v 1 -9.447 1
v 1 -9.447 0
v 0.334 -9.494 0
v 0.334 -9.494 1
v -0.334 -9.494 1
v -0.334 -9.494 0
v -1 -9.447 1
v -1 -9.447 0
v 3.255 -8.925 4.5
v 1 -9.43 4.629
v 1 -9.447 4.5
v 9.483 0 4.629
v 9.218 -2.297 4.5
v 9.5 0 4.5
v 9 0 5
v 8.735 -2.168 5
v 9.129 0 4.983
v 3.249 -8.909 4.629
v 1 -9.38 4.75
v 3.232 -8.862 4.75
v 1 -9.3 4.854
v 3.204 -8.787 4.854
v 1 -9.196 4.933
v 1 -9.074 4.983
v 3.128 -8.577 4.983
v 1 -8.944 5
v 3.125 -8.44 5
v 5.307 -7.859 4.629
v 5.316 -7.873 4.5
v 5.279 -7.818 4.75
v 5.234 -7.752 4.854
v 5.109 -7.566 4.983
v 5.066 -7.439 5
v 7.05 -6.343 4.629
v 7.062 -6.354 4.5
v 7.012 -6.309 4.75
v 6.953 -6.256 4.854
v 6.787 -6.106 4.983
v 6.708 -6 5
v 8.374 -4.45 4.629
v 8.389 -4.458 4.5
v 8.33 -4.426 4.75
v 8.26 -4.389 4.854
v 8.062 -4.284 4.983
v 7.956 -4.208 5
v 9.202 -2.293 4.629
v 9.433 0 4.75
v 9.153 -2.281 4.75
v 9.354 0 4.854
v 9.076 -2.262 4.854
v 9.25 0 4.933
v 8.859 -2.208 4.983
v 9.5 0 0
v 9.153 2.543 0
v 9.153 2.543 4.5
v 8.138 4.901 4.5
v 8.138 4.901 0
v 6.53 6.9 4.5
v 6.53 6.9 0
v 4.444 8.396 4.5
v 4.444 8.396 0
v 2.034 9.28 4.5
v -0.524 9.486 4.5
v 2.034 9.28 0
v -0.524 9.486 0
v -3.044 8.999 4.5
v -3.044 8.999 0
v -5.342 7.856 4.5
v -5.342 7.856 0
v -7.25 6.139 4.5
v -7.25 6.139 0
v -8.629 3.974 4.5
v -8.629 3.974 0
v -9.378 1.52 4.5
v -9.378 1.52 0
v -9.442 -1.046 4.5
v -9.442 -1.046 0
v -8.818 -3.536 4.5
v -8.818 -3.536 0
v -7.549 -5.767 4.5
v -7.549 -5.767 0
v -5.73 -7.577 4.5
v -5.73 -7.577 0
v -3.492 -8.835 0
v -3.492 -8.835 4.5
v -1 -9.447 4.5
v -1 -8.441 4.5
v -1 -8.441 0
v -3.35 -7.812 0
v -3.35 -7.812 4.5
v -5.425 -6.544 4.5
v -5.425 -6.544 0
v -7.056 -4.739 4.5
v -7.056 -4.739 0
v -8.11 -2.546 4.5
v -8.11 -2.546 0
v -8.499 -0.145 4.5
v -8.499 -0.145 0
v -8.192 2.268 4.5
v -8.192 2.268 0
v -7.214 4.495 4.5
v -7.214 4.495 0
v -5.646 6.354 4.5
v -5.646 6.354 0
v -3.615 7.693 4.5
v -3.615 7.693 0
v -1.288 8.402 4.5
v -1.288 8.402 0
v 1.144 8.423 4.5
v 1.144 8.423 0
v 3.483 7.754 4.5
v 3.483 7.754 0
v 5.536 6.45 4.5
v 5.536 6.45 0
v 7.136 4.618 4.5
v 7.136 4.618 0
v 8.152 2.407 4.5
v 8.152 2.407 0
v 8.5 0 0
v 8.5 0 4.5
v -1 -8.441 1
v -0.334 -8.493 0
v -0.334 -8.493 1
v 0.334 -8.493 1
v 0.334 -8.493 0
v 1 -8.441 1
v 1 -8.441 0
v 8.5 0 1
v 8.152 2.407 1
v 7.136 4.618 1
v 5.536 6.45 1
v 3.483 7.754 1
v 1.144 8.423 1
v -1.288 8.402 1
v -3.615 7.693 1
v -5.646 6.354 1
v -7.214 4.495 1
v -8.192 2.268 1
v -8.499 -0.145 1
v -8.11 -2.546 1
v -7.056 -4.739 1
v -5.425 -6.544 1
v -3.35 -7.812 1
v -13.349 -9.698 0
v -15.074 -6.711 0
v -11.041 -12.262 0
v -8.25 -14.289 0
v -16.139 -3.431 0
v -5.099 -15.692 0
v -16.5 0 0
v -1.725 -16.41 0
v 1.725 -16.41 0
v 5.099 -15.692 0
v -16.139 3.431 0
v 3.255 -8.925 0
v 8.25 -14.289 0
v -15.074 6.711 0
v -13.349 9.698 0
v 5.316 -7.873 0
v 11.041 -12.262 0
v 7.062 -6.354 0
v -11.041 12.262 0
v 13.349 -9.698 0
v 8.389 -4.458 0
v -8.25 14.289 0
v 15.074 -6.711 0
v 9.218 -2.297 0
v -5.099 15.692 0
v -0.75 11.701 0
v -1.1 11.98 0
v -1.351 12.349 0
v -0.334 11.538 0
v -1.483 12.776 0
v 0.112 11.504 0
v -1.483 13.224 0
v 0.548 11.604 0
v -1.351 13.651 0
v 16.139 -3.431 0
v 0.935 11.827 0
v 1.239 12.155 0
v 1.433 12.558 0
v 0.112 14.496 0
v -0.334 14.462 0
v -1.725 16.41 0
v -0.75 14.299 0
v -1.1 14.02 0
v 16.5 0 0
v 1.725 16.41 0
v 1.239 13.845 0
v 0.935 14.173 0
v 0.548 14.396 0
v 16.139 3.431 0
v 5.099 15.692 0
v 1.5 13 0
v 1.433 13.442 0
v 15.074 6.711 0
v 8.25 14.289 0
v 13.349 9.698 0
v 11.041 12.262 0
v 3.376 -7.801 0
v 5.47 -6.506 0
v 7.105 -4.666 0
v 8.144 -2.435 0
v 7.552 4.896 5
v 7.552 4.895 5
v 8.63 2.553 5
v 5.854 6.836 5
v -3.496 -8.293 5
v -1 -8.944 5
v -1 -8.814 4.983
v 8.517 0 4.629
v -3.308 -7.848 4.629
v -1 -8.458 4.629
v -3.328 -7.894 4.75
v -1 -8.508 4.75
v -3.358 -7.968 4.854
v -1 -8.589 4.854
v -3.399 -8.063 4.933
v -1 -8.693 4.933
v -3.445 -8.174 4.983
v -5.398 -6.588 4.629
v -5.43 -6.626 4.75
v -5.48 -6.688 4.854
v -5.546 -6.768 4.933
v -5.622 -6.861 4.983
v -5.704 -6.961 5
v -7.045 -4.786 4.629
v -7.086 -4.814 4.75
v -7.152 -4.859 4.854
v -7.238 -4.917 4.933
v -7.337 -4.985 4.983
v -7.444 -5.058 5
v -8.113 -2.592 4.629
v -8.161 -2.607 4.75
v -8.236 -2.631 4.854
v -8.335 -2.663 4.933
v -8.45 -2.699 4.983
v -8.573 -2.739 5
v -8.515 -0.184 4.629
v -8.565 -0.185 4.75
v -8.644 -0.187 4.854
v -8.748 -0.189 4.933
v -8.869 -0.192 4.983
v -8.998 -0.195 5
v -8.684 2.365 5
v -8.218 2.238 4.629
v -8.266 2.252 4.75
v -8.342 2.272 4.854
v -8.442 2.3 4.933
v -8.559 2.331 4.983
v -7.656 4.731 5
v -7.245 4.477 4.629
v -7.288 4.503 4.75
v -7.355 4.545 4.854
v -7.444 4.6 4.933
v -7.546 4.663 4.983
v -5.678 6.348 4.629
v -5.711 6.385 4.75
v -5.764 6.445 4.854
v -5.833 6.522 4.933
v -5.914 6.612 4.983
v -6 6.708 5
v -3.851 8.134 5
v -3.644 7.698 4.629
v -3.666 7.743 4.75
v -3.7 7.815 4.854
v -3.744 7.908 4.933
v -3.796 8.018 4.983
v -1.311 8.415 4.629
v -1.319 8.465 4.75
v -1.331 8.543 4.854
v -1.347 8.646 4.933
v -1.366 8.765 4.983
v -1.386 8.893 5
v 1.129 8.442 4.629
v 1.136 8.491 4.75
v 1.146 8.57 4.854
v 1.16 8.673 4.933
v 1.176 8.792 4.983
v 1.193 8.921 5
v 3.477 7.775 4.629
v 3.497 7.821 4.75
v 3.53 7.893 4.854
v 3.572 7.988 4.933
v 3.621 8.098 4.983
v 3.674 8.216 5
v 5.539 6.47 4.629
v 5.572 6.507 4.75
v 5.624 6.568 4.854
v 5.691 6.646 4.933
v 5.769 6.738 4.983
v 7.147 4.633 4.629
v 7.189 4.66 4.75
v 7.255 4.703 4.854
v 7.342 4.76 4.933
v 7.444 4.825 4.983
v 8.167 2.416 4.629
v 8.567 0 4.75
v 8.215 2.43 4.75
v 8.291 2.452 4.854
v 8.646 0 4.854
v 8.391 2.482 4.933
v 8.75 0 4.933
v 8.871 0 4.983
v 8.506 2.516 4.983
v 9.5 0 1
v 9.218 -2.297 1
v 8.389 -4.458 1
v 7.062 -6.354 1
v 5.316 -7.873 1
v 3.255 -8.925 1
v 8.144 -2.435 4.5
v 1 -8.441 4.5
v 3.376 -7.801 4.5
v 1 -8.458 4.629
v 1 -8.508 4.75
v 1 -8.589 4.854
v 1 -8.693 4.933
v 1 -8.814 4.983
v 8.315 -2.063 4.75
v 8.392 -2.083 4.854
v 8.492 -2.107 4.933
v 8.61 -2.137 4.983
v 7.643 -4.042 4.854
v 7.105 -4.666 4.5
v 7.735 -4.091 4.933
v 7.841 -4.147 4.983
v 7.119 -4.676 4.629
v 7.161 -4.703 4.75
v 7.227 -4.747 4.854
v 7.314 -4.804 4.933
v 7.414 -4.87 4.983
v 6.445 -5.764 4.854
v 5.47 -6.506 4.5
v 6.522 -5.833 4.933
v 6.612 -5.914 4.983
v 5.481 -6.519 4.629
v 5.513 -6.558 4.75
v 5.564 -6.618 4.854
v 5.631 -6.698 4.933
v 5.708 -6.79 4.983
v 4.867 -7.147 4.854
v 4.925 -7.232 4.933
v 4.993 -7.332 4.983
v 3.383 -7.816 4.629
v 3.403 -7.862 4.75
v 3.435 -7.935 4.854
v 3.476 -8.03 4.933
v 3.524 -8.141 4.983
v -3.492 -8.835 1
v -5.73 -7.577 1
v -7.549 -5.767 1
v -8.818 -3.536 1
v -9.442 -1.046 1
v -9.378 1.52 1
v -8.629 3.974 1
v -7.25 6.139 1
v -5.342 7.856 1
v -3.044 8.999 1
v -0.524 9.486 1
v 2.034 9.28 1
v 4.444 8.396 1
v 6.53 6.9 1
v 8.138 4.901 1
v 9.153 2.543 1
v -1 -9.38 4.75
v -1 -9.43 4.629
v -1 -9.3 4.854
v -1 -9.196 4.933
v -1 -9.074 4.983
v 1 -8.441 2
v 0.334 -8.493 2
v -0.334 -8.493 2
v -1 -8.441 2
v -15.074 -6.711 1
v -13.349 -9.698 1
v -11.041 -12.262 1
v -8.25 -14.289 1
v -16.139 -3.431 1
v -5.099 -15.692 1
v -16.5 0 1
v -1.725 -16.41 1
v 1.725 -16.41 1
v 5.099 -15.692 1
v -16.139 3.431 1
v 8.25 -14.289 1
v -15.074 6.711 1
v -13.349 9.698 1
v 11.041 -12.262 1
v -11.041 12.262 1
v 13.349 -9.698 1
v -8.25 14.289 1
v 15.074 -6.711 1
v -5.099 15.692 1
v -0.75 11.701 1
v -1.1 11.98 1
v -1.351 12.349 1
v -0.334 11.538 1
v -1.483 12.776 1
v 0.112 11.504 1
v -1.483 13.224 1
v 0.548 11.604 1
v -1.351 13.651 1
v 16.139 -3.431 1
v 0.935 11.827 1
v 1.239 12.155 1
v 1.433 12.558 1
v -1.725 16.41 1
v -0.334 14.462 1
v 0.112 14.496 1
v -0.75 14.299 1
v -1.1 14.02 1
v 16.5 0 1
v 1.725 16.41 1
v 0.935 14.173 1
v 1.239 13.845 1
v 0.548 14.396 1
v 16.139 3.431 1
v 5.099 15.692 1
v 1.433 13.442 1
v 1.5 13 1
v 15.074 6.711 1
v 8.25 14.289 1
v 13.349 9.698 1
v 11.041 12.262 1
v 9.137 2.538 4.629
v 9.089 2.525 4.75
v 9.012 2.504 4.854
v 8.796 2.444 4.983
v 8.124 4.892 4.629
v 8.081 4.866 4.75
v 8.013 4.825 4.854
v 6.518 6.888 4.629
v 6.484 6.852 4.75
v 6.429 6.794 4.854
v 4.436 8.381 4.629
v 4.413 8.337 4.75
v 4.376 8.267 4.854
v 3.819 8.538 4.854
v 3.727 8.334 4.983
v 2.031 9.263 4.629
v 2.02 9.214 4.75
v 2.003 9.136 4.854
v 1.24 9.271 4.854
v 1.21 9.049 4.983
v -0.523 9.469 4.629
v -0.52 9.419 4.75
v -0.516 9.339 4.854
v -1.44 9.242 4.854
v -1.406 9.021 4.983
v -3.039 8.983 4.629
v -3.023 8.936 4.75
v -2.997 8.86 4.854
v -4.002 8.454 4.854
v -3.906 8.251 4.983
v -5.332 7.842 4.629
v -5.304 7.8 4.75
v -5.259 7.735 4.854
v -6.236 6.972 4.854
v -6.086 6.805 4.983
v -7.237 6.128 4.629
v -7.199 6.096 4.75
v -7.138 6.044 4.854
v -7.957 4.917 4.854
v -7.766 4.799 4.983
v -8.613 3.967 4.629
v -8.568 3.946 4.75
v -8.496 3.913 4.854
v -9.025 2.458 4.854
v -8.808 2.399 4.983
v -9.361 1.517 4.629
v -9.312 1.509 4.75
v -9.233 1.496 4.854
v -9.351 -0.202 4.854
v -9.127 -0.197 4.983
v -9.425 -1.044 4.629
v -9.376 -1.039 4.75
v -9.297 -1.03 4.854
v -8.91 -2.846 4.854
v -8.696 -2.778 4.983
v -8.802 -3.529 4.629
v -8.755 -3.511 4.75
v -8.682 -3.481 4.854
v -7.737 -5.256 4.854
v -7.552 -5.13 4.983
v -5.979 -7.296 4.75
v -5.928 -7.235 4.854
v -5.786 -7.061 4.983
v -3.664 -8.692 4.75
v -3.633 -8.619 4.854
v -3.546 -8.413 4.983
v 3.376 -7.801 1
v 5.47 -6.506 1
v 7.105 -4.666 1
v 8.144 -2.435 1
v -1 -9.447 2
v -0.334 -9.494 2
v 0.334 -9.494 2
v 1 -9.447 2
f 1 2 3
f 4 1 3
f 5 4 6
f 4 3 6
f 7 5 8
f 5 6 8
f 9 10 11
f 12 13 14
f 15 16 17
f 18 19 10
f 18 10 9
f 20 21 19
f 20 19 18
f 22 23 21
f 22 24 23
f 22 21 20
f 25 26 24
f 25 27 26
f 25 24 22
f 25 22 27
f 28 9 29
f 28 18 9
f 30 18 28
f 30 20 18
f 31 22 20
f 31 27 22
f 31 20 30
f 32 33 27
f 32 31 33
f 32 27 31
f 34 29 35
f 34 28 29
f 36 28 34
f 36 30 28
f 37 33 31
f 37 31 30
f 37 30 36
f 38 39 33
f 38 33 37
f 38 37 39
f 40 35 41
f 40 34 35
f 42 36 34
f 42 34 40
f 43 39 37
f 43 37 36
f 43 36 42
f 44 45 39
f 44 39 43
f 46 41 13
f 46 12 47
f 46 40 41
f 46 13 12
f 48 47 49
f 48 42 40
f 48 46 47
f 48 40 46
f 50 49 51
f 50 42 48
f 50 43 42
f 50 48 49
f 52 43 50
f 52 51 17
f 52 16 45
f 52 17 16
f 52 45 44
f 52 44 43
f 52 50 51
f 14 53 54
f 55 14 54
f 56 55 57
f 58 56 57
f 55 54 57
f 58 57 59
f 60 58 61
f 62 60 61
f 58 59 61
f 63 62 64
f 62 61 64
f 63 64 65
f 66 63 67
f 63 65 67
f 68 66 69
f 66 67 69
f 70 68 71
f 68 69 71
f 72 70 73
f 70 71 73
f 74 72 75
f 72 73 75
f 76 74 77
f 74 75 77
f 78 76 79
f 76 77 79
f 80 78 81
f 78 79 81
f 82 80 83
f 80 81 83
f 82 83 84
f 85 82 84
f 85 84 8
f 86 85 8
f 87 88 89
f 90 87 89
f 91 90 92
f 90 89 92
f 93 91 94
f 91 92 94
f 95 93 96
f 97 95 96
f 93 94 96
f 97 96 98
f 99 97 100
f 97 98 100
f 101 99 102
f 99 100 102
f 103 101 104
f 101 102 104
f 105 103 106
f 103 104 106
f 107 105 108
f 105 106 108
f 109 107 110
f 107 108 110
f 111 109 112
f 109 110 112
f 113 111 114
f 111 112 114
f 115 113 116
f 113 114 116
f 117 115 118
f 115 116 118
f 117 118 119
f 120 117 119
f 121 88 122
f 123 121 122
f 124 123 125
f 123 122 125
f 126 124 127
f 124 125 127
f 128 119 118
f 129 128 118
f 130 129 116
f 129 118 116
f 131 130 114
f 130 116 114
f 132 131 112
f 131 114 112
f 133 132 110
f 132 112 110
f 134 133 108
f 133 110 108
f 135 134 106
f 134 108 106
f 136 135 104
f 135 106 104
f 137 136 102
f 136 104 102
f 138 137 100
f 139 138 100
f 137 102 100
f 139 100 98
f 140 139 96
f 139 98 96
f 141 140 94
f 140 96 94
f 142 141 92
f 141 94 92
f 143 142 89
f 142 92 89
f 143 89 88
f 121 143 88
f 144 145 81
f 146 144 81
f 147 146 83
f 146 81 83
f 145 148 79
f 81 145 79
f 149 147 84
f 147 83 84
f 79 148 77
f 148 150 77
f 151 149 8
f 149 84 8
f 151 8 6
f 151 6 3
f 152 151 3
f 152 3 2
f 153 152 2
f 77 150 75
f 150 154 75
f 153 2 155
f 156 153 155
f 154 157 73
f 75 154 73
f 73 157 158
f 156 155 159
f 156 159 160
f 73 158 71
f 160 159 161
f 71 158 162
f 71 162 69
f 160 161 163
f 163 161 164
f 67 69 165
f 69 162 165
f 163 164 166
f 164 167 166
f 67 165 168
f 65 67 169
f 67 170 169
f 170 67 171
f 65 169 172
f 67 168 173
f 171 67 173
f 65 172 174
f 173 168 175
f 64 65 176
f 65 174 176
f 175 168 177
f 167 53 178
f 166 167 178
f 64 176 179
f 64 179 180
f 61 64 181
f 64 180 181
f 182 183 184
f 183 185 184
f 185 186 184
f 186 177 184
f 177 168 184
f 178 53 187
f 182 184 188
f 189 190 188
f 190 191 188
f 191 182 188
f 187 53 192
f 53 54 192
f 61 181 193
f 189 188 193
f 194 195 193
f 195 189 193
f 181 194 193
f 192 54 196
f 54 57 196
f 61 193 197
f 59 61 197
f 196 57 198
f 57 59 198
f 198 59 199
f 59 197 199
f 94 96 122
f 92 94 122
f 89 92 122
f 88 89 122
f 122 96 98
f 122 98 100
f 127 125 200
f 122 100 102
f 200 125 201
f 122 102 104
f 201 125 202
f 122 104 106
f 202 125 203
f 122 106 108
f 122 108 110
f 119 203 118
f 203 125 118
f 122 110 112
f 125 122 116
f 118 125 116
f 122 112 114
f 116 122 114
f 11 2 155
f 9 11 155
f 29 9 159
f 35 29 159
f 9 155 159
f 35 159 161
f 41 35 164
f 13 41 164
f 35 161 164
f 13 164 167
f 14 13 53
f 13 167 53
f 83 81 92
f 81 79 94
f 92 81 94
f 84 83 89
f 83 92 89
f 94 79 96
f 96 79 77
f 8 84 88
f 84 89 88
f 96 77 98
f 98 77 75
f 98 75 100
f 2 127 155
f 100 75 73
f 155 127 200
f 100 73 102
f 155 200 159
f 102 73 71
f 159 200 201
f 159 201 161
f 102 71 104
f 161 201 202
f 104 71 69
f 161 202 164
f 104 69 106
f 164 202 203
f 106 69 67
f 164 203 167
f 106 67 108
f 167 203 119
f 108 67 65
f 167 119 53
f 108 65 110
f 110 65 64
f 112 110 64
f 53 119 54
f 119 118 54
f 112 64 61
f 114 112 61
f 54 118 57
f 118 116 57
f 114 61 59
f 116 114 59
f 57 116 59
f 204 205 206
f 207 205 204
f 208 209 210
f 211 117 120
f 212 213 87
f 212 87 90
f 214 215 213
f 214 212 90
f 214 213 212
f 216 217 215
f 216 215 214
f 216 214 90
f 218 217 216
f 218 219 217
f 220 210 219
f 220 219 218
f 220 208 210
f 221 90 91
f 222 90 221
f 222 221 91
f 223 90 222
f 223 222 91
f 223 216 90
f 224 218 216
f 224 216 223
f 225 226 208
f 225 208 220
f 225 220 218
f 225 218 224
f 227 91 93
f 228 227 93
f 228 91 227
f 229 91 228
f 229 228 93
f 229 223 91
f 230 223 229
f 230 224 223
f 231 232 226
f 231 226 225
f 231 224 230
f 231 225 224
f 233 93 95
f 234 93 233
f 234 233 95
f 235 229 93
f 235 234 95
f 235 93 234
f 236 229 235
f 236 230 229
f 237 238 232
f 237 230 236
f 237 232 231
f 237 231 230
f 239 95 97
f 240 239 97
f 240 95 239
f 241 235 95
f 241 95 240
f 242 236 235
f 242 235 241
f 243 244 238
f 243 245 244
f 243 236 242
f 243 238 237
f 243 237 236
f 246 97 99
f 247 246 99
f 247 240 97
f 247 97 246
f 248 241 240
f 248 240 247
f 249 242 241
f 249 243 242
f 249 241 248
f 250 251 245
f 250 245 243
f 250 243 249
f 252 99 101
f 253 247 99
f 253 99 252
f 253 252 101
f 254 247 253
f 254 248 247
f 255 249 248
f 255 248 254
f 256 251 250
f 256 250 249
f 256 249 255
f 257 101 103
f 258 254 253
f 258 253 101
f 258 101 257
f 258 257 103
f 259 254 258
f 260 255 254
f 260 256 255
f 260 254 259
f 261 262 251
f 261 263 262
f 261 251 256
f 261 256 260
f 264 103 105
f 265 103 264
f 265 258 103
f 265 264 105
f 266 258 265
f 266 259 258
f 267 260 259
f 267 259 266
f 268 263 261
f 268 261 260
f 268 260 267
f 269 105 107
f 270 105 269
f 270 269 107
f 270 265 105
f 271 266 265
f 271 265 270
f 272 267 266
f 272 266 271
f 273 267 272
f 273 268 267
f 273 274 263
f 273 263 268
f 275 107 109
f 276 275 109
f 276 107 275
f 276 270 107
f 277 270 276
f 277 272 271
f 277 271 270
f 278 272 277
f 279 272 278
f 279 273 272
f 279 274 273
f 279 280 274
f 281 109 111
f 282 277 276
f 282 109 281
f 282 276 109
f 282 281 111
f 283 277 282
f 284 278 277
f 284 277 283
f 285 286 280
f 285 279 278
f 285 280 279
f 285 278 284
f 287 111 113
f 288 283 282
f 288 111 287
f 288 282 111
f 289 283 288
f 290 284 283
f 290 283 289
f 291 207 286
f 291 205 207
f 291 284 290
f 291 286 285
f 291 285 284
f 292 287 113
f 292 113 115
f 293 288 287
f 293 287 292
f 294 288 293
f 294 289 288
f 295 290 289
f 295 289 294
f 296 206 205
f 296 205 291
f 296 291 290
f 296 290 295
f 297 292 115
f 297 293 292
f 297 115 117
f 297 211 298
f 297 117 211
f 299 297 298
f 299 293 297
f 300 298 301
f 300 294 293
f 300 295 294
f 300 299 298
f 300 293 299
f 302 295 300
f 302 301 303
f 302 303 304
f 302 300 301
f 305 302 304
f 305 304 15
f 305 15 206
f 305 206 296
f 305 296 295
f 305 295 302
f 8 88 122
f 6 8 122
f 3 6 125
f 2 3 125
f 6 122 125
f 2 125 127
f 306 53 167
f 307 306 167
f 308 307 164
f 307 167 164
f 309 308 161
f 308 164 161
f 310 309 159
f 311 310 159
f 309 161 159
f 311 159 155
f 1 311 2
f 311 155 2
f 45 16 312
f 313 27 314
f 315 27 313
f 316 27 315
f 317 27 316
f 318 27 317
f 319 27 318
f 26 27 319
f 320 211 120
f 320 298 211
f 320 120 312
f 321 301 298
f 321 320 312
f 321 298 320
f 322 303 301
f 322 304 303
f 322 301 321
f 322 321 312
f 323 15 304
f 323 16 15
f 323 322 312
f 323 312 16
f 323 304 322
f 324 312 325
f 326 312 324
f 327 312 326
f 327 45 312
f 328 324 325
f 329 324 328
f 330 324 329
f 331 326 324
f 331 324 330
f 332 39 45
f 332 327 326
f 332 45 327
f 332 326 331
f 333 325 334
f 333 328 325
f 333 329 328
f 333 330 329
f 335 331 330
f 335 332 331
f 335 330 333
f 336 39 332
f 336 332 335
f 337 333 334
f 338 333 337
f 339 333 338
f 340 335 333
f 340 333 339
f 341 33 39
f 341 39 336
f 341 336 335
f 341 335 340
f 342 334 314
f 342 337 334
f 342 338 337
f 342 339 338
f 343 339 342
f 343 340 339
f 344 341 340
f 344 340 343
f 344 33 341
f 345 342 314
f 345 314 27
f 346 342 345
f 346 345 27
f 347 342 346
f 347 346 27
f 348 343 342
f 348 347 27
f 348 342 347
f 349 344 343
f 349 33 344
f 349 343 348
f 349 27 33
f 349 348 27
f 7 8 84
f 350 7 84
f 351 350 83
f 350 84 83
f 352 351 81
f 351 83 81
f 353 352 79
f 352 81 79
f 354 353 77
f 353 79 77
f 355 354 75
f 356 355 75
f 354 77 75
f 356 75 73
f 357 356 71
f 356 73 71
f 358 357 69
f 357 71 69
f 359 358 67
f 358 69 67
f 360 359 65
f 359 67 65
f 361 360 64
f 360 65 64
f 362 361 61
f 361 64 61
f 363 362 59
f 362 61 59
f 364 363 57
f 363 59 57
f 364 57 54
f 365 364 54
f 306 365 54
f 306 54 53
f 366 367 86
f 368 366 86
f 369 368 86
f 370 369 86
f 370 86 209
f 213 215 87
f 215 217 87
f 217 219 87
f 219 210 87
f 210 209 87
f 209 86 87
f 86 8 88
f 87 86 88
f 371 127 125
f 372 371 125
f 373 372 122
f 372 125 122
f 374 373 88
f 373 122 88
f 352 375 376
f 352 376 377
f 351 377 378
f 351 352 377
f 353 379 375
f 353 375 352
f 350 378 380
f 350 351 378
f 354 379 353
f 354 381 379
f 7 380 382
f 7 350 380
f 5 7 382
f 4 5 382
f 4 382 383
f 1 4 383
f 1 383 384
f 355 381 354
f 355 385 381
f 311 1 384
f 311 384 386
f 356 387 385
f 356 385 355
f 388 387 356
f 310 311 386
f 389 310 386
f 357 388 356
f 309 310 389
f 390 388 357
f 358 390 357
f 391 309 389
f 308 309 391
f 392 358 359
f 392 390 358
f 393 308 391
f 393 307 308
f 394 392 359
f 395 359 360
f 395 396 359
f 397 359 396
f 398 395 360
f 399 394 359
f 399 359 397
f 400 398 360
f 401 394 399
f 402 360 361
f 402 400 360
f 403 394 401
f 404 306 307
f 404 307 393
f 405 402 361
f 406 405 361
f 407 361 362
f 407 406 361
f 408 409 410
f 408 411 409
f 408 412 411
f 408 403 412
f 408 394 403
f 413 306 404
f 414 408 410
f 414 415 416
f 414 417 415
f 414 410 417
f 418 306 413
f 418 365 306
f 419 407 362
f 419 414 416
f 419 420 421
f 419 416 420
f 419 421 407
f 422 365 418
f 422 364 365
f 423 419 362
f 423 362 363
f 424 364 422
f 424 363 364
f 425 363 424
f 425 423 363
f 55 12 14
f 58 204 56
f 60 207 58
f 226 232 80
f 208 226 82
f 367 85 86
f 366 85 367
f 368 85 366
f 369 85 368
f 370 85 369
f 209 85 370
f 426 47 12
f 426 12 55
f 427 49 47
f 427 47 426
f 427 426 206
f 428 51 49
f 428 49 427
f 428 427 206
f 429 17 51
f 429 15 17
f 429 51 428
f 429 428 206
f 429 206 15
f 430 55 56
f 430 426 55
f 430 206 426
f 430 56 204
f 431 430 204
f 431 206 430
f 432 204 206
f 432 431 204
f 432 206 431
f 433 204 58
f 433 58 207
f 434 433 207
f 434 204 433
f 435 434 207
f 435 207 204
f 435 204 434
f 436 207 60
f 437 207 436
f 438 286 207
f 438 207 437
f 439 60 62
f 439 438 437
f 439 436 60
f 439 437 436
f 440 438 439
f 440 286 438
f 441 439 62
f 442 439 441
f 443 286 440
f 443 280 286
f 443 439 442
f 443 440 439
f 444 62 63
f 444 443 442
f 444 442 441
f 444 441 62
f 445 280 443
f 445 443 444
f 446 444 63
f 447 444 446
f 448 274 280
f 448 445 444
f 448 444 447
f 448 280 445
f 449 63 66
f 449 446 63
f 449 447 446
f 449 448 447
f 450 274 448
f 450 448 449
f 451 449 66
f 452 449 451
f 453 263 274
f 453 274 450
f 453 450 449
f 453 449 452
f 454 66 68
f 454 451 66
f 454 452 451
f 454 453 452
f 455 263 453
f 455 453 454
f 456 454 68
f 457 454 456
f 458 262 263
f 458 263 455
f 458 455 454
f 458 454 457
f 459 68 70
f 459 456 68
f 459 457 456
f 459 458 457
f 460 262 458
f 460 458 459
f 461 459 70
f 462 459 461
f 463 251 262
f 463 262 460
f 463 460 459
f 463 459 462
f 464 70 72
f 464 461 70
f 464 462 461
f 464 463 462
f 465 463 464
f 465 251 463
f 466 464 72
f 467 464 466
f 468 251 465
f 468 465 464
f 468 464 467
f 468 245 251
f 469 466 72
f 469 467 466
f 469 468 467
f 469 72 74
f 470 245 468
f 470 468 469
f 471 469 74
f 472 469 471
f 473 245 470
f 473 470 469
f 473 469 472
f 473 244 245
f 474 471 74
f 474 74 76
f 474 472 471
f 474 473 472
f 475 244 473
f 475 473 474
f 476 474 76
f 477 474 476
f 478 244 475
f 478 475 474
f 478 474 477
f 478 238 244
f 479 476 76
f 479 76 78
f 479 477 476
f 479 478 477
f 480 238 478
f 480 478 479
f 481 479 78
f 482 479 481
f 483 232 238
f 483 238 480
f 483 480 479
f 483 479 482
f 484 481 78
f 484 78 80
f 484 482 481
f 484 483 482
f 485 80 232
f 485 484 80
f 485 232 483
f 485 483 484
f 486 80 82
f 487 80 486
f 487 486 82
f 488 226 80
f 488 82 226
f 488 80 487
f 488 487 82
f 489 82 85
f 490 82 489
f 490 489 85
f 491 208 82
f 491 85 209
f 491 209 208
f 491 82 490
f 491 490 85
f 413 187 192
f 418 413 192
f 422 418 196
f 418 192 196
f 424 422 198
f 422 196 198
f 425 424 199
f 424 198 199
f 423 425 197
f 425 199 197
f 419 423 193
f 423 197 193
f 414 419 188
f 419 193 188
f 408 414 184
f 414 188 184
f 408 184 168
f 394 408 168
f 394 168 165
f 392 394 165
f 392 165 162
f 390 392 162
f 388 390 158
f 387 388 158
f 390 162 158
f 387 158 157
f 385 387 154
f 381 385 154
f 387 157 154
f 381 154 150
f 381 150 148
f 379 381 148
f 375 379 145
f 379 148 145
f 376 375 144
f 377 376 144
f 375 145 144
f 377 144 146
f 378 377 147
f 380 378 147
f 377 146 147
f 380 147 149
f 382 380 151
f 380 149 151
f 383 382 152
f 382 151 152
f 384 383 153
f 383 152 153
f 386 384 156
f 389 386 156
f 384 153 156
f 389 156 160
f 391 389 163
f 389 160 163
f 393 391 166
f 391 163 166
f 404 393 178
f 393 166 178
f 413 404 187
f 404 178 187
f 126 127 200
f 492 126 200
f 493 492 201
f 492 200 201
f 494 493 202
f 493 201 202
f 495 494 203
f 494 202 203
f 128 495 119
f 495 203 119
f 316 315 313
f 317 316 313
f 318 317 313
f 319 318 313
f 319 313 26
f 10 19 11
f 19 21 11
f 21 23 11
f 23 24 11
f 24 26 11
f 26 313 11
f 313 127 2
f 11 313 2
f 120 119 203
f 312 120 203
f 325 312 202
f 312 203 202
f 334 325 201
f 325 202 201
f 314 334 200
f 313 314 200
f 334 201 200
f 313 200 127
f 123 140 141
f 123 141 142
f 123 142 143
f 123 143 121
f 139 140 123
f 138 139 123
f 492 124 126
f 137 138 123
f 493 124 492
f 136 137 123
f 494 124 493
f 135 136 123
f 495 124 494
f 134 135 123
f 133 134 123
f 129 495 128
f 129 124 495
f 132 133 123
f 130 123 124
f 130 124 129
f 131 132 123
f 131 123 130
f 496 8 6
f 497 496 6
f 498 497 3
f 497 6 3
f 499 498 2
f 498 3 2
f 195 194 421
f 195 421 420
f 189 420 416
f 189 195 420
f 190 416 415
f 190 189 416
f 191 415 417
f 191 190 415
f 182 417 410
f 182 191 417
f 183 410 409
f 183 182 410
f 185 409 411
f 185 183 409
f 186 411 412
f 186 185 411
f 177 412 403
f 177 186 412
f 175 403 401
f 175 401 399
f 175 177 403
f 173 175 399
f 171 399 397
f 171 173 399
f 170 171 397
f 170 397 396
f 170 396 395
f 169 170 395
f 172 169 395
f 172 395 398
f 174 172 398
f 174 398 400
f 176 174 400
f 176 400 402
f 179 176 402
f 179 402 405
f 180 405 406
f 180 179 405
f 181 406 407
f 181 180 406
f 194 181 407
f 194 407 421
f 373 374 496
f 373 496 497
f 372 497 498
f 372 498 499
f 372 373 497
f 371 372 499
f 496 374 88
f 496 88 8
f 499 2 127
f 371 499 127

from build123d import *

# Parameters (mm, degrees)
F0_R     = 16.5
F0_R_2   = 1.5
F1_DEPTH = 1
F2_DEPTH = 5
F3_DEPTH = 2
F4_R     = 0.49999


# Not quite as in the source:
# - a fillet or chamfer is up to 0.001 mm smaller than in the source, because OpenCascade refuses the exact size


with BuildPart() as f1:
    # F0 (on Top) → F1 (new body)
    with BuildSketch(Plane.XY):
        Circle(F0_R)
        with BuildLine():
            ThreePointArc((-1, -9.4472218138), (-6.3541325136, 7.0622234459), (9.5, 0))
            ThreePointArc((9.5, 0), (7.0622234459, -6.3541325136), (1, -9.4472218138))
            ThreePointArc((1, -9.4472218138), (0, -9.5), (-1, -9.4472218138))
        make_face(mode=Mode.SUBTRACT)
        with Locations((0, 13)):
            Circle(F0_R_2, mode=Mode.SUBTRACT)
    extrude(amount=F1_DEPTH)


with BuildPart() as f1b:
    # F0 (on Top) → F1, piece 2 (new body)
    with BuildSketch(Plane.XY):
        with BuildLine():
            ThreePointArc((8.5, 0), (-5.6457948953, 6.3541325136), (-1, -8.4409715081))
            ThreePointArc((-1, -8.4409715081), (0, -8.5), (1, -8.4409715081))
            ThreePointArc((1, -8.4409715081), (6.3541325136, -5.6457948953), (8.5, 0))
        make_face()
    extrude(amount=F1_DEPTH)


with BuildPart() as f2:
    # F0 (on Top) → F2 (new body)
    with BuildSketch(Plane.XY):
        with BuildLine():
            ThreePointArc((1, -9.4472218138), (7.0622234459, -6.3541325136), (9.5, 0))
            ThreePointArc((9.5, 0), (-6.3541325136, 7.0622234459), (-1, -9.4472218138))
            Line((-1, -9.4472218138), (-1, -8.4409715081))
            ThreePointArc((-1, -8.4409715081), (-5.6457948953, 6.3541325136), (8.5, 0))
            ThreePointArc((8.5, 0), (6.3541325136, -5.6457948953), (1, -8.4409715081))
            Line((1, -8.4409715081), (1, -9.4472218138))
        make_face()
    extrude(amount=F2_DEPTH)

    # F4 (radius 0.5 in the source; OpenCascade refuses exactly that, so slightly less here)
    f4_edges = [f2.edges().sort_by_distance(p)[0] for p in [
        (0, 9.5, 5),
        (-5.645795, 6.354133, 5),
    ]]
    fillet(f4_edges, radius=F4_R)


with BuildPart() as f3:
    # F0 (on Top) → F3 (new body)
    with BuildSketch(Plane.XY):
        with BuildLine():
            Line((-1, -8.4409715081), (-1, -9.4472218138))
            ThreePointArc((-1, -9.4472218138), (0, -9.5), (1, -9.4472218138))
            Line((1, -9.4472218138), (1, -8.4409715081))
            ThreePointArc((1, -8.4409715081), (0, -8.5), (-1, -8.4409715081))
        make_face()
    extrude(amount=F3_DEPTH)


solid = Compound([f1.part, f1b.part, f2.part, f3.part])
